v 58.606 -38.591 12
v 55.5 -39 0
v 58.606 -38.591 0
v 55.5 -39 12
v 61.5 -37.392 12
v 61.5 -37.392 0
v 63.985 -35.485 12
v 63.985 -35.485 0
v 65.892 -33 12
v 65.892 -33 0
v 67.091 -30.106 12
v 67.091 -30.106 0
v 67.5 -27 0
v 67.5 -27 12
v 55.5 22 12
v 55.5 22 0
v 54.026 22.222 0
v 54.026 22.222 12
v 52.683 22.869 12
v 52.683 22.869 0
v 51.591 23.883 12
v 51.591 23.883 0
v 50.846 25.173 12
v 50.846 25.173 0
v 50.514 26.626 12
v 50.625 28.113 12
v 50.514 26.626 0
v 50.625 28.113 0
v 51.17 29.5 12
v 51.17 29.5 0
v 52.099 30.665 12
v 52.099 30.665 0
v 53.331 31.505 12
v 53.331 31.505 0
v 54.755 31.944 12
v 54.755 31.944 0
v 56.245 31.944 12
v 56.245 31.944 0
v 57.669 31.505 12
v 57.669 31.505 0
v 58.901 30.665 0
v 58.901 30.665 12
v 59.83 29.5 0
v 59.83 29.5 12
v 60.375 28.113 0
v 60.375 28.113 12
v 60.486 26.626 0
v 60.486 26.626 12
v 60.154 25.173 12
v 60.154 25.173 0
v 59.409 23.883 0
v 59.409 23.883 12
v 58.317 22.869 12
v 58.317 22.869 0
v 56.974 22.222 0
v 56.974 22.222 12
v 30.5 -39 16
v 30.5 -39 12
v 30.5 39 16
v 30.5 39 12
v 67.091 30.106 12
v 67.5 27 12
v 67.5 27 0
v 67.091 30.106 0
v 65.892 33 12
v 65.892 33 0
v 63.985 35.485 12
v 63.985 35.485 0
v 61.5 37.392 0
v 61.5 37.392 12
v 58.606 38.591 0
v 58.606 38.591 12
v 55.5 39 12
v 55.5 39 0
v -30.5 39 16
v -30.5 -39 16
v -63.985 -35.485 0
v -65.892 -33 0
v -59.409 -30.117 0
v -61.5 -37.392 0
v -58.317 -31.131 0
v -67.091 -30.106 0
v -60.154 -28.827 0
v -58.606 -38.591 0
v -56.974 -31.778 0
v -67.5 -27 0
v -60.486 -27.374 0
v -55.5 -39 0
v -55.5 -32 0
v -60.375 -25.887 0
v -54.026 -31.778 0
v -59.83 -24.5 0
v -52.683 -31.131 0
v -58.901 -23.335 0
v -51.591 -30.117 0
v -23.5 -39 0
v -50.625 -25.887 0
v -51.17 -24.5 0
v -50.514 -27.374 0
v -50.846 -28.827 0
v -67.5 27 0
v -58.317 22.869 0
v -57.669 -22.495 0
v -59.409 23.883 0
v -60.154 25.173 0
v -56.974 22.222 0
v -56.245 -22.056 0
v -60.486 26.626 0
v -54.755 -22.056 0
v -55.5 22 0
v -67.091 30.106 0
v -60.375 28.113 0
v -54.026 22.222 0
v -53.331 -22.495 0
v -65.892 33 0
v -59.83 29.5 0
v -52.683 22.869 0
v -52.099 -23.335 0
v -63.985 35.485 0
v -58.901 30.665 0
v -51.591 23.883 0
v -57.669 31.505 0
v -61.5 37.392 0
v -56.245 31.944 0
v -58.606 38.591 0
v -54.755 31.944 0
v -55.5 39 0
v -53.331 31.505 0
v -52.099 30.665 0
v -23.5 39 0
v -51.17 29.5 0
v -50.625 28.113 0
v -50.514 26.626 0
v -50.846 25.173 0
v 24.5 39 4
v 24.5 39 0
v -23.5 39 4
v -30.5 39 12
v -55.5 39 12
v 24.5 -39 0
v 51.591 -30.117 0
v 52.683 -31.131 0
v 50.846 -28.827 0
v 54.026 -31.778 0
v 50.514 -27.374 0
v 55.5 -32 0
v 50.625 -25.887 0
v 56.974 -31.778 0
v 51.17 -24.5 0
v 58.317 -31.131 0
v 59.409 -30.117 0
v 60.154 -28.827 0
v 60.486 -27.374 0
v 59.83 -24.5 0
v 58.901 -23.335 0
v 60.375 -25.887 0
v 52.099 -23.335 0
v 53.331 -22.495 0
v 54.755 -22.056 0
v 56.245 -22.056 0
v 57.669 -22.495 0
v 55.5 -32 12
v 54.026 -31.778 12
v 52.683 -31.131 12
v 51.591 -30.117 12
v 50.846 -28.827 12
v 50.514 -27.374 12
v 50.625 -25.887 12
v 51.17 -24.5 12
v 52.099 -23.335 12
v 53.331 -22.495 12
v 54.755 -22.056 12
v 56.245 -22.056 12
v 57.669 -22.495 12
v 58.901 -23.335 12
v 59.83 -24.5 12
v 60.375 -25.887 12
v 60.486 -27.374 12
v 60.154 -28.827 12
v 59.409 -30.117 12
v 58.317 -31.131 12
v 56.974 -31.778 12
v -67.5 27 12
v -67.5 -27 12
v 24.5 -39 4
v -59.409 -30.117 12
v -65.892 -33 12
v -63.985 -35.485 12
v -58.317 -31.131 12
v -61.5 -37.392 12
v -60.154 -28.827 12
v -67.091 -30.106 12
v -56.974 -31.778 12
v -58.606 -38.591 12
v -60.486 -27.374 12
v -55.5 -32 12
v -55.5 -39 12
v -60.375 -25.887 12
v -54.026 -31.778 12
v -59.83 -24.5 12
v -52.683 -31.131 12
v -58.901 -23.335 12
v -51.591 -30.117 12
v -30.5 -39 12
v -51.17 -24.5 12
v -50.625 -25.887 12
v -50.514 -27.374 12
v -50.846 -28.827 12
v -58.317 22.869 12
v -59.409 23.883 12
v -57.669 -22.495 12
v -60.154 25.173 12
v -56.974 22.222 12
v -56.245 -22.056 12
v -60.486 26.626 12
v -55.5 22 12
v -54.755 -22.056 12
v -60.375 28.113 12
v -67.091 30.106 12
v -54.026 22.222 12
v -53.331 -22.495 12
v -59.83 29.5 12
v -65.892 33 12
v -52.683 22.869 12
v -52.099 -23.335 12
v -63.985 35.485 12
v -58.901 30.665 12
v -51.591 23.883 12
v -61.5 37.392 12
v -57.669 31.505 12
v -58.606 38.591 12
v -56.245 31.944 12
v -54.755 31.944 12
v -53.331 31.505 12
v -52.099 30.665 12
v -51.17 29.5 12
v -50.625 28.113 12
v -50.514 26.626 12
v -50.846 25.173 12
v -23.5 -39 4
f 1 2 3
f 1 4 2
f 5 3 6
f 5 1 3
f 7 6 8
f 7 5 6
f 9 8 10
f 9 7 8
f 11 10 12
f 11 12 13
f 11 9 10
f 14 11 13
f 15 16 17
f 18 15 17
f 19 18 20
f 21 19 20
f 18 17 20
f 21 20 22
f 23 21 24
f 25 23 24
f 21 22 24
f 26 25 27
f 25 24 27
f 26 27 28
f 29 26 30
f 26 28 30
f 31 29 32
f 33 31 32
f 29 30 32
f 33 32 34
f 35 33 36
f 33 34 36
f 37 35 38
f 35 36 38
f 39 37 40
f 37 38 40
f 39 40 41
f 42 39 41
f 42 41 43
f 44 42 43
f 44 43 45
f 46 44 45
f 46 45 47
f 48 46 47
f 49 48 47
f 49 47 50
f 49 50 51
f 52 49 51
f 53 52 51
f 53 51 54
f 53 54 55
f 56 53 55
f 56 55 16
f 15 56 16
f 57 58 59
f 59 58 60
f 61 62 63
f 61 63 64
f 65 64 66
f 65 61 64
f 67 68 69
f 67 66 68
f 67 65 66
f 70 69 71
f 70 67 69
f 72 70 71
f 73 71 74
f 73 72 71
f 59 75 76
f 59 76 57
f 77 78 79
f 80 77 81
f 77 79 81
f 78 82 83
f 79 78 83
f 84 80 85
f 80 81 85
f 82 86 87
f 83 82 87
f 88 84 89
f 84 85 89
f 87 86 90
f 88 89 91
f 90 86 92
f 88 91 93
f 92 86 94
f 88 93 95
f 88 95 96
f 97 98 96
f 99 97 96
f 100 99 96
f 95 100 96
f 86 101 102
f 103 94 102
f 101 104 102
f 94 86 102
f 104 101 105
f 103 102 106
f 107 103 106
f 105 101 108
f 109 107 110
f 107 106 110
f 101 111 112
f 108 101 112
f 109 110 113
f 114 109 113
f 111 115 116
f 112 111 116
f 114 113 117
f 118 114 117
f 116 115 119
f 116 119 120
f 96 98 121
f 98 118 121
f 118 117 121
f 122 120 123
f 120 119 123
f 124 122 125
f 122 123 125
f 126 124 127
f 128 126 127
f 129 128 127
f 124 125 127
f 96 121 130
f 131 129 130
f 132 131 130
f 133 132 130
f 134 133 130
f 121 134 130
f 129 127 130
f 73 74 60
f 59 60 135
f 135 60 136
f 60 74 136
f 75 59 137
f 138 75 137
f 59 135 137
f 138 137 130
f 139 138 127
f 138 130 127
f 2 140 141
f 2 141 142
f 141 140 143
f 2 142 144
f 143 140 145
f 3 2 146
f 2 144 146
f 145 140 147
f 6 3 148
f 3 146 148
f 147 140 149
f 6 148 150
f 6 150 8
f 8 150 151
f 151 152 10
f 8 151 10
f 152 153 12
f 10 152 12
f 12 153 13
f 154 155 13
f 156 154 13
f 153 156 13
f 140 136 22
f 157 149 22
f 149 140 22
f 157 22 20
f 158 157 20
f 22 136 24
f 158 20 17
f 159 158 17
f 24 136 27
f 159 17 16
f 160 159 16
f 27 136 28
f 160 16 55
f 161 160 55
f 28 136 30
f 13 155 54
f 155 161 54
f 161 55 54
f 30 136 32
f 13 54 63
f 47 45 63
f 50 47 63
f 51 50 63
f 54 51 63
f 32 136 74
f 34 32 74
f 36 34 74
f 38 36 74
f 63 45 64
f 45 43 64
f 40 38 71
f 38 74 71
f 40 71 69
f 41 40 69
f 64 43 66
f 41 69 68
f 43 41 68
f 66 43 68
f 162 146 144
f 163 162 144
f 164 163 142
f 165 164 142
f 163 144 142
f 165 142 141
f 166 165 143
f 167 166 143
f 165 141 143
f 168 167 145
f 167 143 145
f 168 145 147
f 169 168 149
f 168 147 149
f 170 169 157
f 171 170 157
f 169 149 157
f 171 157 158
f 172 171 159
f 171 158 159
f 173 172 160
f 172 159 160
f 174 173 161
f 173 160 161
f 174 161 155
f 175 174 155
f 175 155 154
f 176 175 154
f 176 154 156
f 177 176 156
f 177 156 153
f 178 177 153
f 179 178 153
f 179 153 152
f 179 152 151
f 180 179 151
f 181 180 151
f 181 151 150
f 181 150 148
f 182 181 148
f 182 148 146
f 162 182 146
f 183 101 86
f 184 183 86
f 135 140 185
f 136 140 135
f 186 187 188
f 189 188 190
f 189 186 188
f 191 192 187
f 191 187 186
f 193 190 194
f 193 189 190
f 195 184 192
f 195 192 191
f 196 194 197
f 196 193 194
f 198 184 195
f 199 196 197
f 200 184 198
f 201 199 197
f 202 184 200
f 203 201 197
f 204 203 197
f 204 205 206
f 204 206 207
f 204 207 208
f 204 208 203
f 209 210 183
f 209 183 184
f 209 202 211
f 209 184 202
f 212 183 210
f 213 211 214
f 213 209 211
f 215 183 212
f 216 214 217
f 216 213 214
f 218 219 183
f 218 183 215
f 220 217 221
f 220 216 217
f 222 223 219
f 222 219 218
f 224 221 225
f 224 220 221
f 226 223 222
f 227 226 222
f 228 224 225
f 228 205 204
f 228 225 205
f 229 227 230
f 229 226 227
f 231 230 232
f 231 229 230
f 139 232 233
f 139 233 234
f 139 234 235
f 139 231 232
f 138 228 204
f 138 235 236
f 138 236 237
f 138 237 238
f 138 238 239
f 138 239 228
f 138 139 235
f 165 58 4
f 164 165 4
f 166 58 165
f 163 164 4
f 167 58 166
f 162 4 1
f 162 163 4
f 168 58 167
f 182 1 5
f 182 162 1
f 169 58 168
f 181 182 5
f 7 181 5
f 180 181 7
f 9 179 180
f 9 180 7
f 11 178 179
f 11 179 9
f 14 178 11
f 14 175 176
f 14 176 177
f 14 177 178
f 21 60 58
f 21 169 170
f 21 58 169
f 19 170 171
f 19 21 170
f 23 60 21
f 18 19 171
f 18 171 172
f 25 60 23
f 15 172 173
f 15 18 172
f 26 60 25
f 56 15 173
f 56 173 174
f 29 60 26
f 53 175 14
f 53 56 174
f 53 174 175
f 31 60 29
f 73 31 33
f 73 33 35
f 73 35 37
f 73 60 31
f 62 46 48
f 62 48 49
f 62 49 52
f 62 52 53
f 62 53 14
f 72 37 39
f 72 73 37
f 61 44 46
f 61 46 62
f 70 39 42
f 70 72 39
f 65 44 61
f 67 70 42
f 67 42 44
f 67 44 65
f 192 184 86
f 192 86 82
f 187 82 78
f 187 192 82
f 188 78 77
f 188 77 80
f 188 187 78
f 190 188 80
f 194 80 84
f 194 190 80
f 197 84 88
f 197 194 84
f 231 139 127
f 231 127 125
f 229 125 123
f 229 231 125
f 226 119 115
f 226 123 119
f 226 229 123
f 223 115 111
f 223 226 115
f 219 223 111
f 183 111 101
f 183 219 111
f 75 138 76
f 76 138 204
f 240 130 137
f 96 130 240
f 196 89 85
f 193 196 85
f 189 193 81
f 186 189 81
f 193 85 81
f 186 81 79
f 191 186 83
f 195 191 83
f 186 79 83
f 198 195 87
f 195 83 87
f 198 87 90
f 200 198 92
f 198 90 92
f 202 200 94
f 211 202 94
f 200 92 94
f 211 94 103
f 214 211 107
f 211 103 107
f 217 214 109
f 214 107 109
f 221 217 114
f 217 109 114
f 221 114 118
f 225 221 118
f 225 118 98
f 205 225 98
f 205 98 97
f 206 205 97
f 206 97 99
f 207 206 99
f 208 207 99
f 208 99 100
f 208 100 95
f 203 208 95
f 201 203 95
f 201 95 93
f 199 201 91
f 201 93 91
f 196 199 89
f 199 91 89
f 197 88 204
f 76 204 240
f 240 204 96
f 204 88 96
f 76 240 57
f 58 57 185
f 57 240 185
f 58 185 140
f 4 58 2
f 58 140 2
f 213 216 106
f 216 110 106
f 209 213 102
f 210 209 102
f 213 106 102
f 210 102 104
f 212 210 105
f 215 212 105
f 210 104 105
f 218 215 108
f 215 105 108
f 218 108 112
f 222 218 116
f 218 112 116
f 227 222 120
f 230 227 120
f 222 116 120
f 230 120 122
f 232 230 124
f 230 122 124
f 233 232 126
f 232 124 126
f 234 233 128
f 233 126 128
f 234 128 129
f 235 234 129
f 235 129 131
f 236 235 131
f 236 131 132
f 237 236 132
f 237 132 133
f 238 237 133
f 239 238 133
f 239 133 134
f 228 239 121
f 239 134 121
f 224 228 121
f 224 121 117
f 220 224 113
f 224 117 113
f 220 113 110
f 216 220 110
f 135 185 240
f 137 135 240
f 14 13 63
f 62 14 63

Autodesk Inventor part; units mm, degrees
ref_plane "YZ Plane" through (0, 0, 0) normal (1, 0, 0) x (0, 1, 0)
ref_plane "XZ Plane" through (0, 0, 0) normal (0, 1, 0) x (-1, 0, 0)
sketch "Sketch1" plane through (0, 0, 0) normal (0, 0, 1) x (1, 0, 0)
  line L0 (-67.5, -39) -> (67.5, -39)
  line L1 (67.5, -39) -> (67.5, 39)
  line L2 (67.5, 39) -> (-67.5, 39)
  line L3 (-67.5, 39) -> (-67.5, -39)
  point P0 (0, 0)
  point P1 (-67.5, 0)
  point P2 (0, 39)
  dimension "d0" = 78
  dimension "d1" = 135
extrude "Extrusion1" add sketch "Sketch1" along normal blind 12
sketch "Sketch2" plane through (0, 0, 12) normal (0, 0, 1) x (1, 0, 0)
  line L0 (67.5, -39) -> (-67.5, -39) projected
  line L1 (-67.5, 39) -> (67.5, 39) projected
  line L2 (-30.5, -39) -> (30.5, -39)
  line L3 (30.5, -39) -> (30.5, 39)
  line L4 (30.5, 39) -> (-30.5, 39)
  line L5 (-30.5, 39) -> (-30.5, -39)
  line L6 (0, 54.6) -> (0, -54.6) projected
  line L7 (-95.2, 0) -> (95.2, 0) projected
  dimension "d4" = 61
extrude "Extrusion2" add sketch "Sketch2" along normal blind 4
sketch "Sketch3" plane through (0, 0, 0) normal (0, 0, -1) x (-1, 0, 0)
  line L0 (67.5, -39) -> (-67.5, -39) projected
  line L1 (67.5, 39) -> (67.5, -39) projected
  line L2 (-67.5, 39) -> (67.5, 39) projected
  line L3 (23.5, -39) -> (-24.5, -39)
  line L4 (-24.5, -39) -> (-24.5, 39)
  line L5 (-24.5, 39) -> (23.5, 39)
  line L6 (23.5, 39) -> (23.5, -39)
  dimension "d8" = 48
  dimension "d9" = 44
extrude "Extrusion3" cut sketch "Sketch3" against normal blind 4 contours L0 L4 L2 L6
sketch "Sketch4" plane through (0, 0, 12) normal (0, 0, 1) x (1, 0, 0)
  line L0 (67.5, 39) -> (67.5, -39) projected
  line L1 (30.5, 39) -> (67.5, 39) projected
  line L2 (67.5, 0) -> (0.1063, 0) construction
  line L3 (-30.5, -39) -> (-30.5, 39) projected
  line L4 (30.5, -39) -> (-30.5, -39) projected
  line L5 (30.5, 39) -> (30.5, -39) projected
  line L6 (-30.5, 39) -> (30.5, 39) projected
  line L7 (-30.5, -39) -> (-30.5, 39) projected
  line L8 (-67.5, 39) -> (-30.5, 39) projected
  line L9 (-67.5, -39) -> (-67.5, 39) projected
  line L10 (-30.5, -39) -> (-67.5, -39) projected
  line L11 (0, 39) -> (0, 3.4704) construction
  point P0 (55.5, 27)
  point P1 (-55.5, 27)
  point P2 (-55.5, -27)
  point P3 (55.5, -27)
  dimension "d12" = 111
  dimension "d13" = 54
hole "Hole1" at (55.5, 27, 12) at (-55.5, 27, 12) at (-55.5, -27, 12) at (55.5, -27, 12) direction (0, 0, -1) diameter 10 depth 12
fillet "Fillet1" radius 12 4 edges at (67.5, 39, 6) (67.5, -39, 6) (-67.5, 39, 6) (-67.5, -39, 6)
ref_plane "Midplane" through (0, -39, 16) normal (1, 0, 0) x (0, 0, -1)
properties part number "Base Plate" material "Carbon Steel"
